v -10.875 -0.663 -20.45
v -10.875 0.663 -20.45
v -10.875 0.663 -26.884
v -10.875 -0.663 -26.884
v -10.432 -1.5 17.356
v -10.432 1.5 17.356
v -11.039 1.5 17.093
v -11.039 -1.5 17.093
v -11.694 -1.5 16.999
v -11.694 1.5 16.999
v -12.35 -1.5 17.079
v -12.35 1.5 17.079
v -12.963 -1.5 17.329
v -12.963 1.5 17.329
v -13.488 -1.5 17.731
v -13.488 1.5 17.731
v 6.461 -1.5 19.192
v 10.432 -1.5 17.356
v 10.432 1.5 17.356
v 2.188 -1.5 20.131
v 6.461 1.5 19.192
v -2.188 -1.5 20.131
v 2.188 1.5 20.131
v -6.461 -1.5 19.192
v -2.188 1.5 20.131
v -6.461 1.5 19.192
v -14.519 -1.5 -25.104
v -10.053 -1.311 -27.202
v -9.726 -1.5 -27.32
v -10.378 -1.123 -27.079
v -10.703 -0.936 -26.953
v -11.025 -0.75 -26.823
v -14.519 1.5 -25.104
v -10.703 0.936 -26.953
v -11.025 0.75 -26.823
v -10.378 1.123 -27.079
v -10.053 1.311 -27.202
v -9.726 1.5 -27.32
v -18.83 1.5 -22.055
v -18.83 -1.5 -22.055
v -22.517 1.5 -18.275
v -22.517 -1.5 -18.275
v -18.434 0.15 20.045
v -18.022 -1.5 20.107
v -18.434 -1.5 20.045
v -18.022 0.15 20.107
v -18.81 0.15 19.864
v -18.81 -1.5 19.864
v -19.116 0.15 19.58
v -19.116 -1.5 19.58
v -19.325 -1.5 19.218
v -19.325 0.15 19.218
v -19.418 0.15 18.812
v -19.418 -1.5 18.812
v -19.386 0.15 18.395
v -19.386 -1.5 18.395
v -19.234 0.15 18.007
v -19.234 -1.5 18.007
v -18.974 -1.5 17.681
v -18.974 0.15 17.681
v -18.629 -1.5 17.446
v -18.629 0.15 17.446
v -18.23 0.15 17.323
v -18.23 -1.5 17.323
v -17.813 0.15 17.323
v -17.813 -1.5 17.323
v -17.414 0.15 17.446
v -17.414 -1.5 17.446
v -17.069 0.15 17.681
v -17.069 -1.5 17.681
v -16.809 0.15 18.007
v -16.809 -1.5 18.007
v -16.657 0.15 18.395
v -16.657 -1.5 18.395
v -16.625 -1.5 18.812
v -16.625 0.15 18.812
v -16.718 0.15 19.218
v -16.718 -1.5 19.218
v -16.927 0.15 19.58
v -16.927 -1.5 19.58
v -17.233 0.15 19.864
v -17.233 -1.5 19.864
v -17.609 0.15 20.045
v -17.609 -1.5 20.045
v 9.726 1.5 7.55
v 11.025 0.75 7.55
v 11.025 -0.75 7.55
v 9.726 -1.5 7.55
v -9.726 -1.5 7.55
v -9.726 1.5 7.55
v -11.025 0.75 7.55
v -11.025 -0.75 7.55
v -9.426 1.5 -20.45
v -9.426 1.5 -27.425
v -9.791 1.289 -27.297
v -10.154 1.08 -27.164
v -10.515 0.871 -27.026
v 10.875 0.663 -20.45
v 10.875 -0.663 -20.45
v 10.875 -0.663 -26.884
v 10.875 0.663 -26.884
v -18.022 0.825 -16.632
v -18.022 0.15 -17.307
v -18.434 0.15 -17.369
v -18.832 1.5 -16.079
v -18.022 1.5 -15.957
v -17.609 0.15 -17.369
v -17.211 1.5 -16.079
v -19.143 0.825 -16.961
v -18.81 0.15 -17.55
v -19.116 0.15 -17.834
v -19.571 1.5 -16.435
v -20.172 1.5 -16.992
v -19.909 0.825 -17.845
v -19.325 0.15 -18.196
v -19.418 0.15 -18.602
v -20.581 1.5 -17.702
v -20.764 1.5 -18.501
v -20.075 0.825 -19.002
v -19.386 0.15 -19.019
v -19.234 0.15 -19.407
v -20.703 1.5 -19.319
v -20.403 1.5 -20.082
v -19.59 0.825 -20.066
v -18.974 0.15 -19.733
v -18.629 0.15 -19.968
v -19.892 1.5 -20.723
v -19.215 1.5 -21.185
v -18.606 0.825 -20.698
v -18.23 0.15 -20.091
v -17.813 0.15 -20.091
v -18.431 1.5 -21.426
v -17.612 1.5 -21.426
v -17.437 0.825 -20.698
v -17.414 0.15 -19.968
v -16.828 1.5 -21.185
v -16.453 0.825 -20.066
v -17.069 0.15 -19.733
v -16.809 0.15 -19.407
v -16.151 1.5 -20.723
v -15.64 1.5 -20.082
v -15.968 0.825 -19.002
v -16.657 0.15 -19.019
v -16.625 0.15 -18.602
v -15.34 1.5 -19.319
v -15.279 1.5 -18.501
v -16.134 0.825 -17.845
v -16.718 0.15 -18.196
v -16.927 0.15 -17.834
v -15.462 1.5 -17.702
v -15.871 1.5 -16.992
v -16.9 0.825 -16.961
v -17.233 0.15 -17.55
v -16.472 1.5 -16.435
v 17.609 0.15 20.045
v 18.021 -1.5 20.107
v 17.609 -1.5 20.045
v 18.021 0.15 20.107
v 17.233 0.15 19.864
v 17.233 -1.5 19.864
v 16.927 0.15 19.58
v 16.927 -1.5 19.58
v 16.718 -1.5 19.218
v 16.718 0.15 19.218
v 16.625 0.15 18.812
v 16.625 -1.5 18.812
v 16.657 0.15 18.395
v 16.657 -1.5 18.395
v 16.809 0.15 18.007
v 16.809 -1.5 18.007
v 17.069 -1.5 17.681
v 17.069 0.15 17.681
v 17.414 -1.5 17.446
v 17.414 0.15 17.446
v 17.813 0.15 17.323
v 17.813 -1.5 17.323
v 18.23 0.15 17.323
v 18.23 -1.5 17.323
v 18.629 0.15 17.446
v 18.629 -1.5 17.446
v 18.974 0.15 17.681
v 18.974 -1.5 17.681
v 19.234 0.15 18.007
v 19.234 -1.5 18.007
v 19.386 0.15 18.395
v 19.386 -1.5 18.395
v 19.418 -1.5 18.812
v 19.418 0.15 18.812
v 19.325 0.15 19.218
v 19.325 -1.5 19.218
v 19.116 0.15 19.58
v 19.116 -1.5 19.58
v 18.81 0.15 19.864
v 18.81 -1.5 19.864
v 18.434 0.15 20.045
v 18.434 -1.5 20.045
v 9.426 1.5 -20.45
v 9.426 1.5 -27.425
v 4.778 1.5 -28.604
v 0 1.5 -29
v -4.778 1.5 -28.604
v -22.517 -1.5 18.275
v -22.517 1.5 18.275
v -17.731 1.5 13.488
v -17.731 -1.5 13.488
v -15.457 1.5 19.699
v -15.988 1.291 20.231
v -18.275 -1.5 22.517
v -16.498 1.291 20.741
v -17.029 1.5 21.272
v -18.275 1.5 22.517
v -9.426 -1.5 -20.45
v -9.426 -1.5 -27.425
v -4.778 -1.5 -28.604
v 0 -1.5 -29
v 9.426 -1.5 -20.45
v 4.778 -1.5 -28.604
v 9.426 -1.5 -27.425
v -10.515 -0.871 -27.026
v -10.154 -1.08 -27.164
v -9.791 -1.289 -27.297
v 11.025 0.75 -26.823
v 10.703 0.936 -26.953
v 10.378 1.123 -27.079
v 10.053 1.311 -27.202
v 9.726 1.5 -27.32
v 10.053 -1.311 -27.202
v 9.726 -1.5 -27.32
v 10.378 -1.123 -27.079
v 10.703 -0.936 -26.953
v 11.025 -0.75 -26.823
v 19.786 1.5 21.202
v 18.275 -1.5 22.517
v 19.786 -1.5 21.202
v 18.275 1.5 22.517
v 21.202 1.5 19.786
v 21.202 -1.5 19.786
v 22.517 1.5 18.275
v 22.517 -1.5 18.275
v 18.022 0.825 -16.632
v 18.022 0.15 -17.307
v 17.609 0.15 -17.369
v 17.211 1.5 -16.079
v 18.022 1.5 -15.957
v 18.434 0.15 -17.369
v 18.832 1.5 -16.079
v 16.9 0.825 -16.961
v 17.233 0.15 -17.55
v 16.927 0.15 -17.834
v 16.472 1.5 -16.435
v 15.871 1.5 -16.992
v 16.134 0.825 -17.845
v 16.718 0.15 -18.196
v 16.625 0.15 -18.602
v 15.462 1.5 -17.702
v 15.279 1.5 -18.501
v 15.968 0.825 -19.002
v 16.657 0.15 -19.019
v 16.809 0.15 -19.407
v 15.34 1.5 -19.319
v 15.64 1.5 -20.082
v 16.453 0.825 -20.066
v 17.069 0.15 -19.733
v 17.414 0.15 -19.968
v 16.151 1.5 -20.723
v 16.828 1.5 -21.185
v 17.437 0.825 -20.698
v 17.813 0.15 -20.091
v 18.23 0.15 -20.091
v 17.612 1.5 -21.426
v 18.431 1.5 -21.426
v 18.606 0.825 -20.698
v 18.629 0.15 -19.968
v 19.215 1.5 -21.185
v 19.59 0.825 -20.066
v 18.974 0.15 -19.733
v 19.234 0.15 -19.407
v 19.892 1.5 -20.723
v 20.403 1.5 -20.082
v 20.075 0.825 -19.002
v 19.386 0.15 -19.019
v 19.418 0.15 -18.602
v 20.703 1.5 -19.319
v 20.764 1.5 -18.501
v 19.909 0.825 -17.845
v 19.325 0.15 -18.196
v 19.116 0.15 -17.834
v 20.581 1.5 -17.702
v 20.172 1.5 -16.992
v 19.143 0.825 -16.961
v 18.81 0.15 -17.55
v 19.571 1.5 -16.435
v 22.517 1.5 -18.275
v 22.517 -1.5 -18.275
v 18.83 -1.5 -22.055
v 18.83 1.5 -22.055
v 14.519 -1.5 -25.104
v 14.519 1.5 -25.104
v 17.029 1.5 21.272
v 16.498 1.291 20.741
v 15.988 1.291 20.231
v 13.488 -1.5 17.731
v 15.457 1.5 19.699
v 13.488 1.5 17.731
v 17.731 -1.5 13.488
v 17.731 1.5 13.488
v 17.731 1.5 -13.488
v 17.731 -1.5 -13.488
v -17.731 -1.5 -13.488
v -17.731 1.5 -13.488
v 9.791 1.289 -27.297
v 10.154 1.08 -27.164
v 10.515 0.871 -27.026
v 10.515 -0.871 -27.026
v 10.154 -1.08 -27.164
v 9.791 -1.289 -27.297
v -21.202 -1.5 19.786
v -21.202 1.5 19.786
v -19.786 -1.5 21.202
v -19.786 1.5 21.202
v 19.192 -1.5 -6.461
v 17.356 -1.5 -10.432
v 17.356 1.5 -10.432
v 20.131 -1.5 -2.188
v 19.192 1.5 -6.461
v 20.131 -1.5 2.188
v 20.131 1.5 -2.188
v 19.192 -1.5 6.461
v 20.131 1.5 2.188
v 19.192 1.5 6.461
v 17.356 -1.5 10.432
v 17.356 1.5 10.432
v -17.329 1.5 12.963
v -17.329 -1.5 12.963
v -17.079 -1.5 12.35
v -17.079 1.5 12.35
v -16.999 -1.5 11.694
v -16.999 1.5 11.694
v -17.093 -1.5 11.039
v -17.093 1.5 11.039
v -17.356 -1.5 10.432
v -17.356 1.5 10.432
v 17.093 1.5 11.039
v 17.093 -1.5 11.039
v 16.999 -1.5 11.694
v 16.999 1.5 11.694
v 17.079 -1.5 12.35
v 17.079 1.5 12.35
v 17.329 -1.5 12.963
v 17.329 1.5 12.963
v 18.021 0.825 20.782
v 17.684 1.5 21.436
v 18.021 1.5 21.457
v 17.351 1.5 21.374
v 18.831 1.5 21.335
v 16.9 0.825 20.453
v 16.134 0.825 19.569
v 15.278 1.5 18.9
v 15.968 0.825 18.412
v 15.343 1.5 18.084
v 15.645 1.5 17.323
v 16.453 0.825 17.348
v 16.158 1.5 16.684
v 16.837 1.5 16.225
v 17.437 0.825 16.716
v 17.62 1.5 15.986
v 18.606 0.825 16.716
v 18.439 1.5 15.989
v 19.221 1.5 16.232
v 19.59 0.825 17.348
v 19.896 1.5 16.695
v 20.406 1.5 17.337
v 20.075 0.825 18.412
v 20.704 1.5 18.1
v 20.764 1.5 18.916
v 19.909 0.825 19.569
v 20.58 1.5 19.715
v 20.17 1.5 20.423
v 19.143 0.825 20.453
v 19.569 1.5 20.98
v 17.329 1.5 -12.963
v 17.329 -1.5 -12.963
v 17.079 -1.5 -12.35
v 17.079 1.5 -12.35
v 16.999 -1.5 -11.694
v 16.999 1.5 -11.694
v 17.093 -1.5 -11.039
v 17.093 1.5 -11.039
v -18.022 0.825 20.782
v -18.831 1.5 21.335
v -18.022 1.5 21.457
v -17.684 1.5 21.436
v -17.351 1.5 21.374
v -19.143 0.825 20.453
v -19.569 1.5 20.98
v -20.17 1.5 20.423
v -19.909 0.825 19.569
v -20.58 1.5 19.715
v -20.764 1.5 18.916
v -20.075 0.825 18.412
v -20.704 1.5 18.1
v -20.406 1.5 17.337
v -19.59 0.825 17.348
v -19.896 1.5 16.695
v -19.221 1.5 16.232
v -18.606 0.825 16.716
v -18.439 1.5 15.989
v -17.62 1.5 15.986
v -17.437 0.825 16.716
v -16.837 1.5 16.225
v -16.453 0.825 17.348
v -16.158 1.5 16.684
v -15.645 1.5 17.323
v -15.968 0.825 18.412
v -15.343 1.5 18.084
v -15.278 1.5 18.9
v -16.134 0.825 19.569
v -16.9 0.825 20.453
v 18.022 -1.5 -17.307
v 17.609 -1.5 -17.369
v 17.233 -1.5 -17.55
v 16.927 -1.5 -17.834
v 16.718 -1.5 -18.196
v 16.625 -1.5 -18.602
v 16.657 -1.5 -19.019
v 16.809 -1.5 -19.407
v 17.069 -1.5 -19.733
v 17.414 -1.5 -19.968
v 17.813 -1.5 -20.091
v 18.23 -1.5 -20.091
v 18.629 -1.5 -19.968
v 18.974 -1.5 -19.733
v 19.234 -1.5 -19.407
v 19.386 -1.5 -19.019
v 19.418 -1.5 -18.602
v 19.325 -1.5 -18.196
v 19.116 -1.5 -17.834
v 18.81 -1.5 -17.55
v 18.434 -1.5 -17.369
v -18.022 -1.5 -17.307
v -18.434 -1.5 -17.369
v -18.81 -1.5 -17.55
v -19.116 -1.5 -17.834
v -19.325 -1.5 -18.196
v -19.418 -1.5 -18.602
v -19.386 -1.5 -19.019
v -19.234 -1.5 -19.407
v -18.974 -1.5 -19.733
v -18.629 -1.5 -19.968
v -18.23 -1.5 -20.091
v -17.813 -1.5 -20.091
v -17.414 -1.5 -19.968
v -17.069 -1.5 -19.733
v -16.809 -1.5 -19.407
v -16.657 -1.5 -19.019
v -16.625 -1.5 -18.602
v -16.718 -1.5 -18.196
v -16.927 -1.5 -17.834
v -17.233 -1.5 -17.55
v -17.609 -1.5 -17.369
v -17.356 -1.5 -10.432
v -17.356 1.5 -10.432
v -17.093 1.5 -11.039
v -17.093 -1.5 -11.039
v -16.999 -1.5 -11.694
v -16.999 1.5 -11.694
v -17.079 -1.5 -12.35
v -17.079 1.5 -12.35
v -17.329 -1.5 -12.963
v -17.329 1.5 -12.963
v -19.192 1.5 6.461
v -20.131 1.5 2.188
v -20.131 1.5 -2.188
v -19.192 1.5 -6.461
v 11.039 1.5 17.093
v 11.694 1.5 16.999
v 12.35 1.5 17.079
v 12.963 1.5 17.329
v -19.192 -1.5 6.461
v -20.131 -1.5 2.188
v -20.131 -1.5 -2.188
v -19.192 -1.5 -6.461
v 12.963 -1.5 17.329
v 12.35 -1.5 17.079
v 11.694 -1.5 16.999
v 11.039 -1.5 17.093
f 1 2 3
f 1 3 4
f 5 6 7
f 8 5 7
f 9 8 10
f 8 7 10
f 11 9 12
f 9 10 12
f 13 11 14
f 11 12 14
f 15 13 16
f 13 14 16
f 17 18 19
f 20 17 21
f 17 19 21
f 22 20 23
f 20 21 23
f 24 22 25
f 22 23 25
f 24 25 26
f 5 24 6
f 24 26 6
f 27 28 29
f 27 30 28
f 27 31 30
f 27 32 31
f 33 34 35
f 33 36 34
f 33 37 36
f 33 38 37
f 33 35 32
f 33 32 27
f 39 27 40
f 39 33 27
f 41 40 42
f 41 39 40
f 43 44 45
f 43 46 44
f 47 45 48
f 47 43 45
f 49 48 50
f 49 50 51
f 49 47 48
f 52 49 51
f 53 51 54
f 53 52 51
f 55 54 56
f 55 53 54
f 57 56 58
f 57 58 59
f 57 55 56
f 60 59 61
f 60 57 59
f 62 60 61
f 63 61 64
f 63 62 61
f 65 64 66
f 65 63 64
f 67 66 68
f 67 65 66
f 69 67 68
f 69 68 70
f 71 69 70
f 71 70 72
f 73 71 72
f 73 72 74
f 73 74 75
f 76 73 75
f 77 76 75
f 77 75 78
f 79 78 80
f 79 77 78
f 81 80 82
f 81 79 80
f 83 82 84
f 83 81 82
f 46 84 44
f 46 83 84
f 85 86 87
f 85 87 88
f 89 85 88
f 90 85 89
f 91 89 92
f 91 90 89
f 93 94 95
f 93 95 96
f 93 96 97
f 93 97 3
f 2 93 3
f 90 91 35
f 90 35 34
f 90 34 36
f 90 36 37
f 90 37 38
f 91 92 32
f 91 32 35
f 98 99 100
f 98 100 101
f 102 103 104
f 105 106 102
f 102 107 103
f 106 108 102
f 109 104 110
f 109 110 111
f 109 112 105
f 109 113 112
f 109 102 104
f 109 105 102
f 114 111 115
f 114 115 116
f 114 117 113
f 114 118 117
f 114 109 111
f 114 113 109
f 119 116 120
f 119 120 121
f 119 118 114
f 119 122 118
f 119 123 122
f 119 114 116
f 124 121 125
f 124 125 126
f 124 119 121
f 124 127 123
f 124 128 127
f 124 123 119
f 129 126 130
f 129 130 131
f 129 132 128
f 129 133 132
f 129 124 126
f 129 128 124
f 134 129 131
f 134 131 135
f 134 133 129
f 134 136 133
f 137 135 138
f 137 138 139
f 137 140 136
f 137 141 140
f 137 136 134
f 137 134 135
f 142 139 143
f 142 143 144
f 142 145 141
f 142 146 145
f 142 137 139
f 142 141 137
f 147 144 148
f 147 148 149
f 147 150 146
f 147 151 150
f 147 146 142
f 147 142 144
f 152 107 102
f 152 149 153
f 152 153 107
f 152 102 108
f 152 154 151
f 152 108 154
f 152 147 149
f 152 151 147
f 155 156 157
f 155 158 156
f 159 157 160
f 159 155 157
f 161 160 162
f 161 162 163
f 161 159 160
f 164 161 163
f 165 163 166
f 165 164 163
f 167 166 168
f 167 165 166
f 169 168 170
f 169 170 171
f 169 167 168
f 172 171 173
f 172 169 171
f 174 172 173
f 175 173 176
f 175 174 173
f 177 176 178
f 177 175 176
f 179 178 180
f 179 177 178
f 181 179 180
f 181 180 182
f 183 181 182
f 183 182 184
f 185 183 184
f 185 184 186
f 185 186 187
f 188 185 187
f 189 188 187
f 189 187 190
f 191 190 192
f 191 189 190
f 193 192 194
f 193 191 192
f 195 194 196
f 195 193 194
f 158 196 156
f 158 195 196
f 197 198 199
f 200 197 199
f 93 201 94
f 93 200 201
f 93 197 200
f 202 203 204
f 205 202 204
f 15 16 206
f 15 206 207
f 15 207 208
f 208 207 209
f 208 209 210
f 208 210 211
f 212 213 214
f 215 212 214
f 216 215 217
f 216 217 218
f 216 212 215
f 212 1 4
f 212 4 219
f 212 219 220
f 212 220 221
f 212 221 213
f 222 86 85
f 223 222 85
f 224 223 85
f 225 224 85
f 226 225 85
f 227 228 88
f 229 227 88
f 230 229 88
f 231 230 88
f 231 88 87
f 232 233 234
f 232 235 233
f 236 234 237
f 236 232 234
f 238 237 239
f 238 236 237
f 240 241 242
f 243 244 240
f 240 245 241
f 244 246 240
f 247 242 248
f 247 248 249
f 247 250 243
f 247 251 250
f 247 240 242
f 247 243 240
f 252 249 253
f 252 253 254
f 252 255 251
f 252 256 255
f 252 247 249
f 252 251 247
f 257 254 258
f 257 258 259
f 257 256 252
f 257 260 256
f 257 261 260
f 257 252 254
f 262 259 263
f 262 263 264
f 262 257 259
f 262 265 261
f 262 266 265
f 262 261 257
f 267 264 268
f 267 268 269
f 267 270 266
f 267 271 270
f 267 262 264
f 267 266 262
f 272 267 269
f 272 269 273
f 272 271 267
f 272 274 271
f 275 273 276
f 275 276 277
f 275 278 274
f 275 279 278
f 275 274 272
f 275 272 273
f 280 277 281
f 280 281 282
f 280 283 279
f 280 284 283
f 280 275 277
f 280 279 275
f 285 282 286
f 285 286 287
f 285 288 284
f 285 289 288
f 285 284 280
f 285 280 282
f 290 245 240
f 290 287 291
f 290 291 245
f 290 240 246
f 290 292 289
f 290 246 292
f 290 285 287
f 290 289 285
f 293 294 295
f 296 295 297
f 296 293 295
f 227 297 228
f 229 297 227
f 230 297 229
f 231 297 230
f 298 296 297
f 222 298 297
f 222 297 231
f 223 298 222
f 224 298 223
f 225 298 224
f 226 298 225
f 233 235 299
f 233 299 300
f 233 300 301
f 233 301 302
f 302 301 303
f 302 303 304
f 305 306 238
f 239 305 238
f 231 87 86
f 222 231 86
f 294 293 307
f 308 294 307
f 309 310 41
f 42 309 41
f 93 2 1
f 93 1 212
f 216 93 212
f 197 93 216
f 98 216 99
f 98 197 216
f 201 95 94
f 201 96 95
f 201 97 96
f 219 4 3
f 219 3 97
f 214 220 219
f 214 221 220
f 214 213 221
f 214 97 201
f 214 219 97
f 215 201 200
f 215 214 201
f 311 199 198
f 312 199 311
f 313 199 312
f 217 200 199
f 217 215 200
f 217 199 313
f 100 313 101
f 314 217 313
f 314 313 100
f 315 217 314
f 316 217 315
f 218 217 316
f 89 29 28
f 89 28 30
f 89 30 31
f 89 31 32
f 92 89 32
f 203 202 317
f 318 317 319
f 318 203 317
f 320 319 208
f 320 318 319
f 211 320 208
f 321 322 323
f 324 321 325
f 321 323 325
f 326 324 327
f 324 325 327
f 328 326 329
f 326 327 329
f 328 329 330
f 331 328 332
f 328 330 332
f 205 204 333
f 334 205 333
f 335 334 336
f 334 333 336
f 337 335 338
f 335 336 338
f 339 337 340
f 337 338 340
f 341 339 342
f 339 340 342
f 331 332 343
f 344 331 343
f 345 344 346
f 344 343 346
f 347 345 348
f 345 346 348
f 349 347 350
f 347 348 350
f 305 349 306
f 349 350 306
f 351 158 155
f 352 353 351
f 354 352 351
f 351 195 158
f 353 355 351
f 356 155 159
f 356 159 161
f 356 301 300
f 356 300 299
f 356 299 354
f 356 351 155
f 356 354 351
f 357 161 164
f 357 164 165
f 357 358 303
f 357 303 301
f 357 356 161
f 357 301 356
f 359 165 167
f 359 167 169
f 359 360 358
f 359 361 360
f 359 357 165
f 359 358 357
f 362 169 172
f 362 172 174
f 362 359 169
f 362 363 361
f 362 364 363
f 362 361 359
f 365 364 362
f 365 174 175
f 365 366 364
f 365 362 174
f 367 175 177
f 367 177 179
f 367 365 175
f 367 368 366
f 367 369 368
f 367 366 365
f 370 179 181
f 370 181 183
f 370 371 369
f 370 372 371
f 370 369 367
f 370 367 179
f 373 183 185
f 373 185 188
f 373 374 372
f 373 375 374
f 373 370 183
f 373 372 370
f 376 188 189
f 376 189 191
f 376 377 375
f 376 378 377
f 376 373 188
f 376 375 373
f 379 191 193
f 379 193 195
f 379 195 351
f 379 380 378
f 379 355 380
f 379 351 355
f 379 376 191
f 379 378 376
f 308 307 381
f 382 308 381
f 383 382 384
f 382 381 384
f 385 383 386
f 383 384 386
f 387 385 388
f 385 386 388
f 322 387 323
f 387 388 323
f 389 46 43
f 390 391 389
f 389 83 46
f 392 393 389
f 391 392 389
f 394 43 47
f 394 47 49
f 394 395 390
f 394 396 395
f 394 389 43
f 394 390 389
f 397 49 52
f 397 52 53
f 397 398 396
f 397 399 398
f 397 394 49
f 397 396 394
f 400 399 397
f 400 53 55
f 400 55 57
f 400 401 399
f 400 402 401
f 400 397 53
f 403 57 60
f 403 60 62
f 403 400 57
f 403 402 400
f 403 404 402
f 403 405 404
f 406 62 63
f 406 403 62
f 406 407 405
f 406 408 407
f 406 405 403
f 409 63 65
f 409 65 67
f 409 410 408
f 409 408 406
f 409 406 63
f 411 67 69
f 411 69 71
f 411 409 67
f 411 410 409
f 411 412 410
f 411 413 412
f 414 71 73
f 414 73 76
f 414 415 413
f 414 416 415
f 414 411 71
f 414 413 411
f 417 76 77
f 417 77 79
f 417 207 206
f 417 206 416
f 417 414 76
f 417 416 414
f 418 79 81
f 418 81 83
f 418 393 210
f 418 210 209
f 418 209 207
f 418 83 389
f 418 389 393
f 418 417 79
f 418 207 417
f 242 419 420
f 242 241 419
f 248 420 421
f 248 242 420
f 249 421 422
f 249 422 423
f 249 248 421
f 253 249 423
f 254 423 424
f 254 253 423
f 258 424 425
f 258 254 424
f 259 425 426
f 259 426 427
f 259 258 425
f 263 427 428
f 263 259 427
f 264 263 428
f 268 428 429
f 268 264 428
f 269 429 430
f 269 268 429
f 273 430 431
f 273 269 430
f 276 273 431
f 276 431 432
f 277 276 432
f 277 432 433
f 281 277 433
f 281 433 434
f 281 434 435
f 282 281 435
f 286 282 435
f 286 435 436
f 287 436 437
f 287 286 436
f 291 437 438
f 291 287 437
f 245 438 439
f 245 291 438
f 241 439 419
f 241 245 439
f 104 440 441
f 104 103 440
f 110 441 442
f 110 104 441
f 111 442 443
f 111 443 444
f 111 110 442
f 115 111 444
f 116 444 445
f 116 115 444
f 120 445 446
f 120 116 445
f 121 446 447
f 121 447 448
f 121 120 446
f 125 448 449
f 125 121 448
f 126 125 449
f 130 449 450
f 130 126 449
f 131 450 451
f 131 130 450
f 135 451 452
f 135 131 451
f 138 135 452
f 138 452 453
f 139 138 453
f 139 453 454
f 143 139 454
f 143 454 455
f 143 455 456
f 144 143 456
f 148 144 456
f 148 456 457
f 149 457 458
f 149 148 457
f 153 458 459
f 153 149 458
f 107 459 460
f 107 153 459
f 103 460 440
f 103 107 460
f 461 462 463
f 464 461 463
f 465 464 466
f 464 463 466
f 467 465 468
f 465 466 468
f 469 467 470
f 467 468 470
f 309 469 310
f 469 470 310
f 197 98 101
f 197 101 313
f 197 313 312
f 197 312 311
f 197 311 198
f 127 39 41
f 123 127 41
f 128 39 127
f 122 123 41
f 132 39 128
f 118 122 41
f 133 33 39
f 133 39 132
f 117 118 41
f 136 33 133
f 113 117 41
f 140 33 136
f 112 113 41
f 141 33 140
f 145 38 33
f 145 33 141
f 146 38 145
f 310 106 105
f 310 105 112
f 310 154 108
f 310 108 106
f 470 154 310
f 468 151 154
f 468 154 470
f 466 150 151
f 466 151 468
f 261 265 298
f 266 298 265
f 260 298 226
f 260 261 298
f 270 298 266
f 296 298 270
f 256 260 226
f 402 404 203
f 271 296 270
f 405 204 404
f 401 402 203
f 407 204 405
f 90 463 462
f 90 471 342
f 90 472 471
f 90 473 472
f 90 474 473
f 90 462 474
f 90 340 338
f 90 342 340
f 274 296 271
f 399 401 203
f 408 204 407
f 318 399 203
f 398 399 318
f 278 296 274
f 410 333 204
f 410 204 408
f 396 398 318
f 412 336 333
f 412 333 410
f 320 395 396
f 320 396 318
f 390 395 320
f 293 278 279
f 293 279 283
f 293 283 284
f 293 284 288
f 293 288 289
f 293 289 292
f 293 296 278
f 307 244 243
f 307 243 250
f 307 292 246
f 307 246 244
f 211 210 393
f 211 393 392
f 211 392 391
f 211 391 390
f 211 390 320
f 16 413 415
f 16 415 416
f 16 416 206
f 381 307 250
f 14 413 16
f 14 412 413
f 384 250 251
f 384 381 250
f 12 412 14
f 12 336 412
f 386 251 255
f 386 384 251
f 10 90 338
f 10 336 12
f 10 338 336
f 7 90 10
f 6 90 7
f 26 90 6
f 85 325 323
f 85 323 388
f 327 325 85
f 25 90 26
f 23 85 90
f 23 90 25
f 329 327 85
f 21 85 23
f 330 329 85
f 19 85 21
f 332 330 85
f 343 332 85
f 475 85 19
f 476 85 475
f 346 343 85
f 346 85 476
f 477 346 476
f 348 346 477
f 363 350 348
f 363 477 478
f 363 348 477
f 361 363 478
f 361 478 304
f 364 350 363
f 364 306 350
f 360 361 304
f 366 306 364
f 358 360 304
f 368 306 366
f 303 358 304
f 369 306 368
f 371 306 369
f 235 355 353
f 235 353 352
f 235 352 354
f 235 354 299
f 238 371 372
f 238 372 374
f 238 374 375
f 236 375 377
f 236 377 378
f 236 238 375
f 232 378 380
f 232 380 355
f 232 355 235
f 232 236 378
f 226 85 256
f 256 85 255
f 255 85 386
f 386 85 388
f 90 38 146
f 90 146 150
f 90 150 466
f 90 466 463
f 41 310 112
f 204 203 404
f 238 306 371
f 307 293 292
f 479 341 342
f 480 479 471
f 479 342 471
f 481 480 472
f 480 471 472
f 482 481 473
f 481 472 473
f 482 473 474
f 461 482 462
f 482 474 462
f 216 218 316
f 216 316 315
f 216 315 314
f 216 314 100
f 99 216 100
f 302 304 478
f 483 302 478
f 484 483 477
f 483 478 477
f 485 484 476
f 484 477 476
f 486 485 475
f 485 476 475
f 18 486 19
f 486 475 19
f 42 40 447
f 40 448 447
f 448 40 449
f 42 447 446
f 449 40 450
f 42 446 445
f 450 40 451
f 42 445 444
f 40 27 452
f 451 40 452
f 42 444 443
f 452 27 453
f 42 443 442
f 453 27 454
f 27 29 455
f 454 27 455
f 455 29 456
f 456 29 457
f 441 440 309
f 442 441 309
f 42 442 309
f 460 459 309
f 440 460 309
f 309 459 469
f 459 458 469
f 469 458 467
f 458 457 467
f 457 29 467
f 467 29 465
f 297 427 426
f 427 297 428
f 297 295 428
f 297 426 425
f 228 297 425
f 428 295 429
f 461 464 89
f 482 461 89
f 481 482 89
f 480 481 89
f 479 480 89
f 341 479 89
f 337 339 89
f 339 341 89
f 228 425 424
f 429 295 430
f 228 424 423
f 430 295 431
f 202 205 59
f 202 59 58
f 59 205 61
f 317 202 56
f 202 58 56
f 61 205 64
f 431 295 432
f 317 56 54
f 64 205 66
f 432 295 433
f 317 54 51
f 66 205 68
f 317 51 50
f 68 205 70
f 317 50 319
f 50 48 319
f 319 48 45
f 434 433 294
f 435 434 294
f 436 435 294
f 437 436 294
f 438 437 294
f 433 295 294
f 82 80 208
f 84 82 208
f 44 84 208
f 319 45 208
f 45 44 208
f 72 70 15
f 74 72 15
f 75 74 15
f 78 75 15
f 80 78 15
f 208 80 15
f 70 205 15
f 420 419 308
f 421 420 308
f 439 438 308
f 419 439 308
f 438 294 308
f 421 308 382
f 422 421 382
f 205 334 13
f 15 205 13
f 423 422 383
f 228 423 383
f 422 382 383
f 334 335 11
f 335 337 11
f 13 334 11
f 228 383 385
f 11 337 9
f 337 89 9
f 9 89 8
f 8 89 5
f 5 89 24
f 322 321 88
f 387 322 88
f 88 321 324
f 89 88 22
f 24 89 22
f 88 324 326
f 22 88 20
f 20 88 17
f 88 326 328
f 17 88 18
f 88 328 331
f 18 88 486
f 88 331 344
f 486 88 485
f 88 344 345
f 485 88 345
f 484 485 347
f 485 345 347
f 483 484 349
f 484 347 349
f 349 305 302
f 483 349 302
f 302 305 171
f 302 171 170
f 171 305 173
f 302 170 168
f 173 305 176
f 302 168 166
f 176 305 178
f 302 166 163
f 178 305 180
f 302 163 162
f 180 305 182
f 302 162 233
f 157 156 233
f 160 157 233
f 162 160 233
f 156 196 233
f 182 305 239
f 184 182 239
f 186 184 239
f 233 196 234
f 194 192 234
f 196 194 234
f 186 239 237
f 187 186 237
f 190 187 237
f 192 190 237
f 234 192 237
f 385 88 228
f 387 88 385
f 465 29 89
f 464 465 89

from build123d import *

# Parameters (mm, degrees)
SKETCH1_R                                      = 29
BOSS_EXTRUDE1_DEPTH                            = 1.5
CUT_EXTRUDE1_DEPTH                             = 42.12177039
BOSS_EXTRUDE2_REACH                            = 46.997
BOSS_EXTRUDE2_END_RADIUS                       = 29
BOSS_EXTRUDE3_REACH                            = 59.346
BOSS_EXTRUDE3_END_RADIUS                       = 29
CUT_EXTRUDE8_DEPTH                             = 42.12177039
CSK_FOR_M2_5_FLAT_HEAD_MACHINE_SCREW2_AT_COUNT = 2
CSK_FOR_M2_5_FLAT_HEAD_MACHINE_SCREW2_AT_PITCH = 36.043
CSK_FOR_M2_5_FLAT_HEAD_MACHINE_SCREW_2_COUNT   = 2
CSK_FOR_M2_5_FLAT_HEAD_MACHINE_SCREW_2_PITCH   = 51.950988874
CSK_FOR_M2_5_FLAT_HEAD_MACHINE_SCREW_3_COUNT   = 2
CSK_FOR_M2_5_FLAT_HEAD_MACHINE_SCREW_3_PITCH   = 37.414


with BuildPart() as part:
    # Sketch1 → Boss-Extrude1 (new, symmetric)
    with BuildSketch(Plane(origin=(0, 0, 0), x_dir=(1, 0, 0), z_dir=(0, 1, 0))):
        with Locations(Location((0, 0, 0), (0, 0, 270))):
            Circle(SKETCH1_R)
    extrude(amount=BOSS_EXTRUDE1_DEPTH, both=True)

    # Sketch2 → Cut-Extrude1 (cut, through all)
    with BuildSketch(Plane(origin=(0, 1.5, 0), x_dir=(1, 0, 0), z_dir=(0, 1, 0))):
        Polygon((-11.025, 7.55), (-11.025, 29), (11.025, 29), (11.025, 7.55), (11.025, -7.55), (-11.025, -7.55), align=None)
    extrude(amount=-CUT_EXTRUDE1_DEPTH, mode=Mode.SUBTRACT)

    # Boss-Extrude2: up to this cylinder (the profile starts inside it)
    boss_extrude2_end = Plane(origin=(0, -0.7325095, 0), z_dir=(0, -1, 0)) * Cylinder(BOSS_EXTRUDE2_END_RADIUS, 154.459019, mode=Mode.PRIVATE)
    # Sketch3 → Boss-Extrude2 (add, up to the surface)
    with BuildSketch(Plane(origin=(0, 0, 7.55), x_dir=(-1, 0, 0), z_dir=(0, 0, -1)), mode=Mode.PRIVATE) as boss_extrude2_sk1:
        Polygon((-11.525, -1.5), (-9.725961894, -1.5), (-11.025, -0.75), (-11.025, 0.75), (-9.725961894, 1.5), (-11.525, 1.5), align=None)
    boss_extrude2_tool1 = extrude(boss_extrude2_sk1.sketch, amount=BOSS_EXTRUDE2_REACH, mode=Mode.PRIVATE) & boss_extrude2_end
    add(boss_extrude2_tool1.solids().sort_by_distance((10.625481, -1.465019, 7.55))[0])
    # Sketch3 → Boss-Extrude2 (add, up to the surface)
    with BuildSketch(Plane(origin=(0, 0, 7.55), x_dir=(-1, 0, 0), z_dir=(0, 0, -1)), mode=Mode.PRIVATE) as boss_extrude2_sk2:
        Polygon((11.525, 1.5), (11.525, -1.5), (9.725961894, -1.5), (11.025, -0.75), (11.025, 0.75), (9.725961894, 1.5), align=None)
    boss_extrude2_tool2 = extrude(boss_extrude2_sk2.sketch, amount=BOSS_EXTRUDE2_REACH, mode=Mode.PRIVATE) & boss_extrude2_end
    add(boss_extrude2_tool2.solids().sort_by_distance((-11.490019, 0, 7.55))[0])

    # Sketch17 → Cut-Extrude8 (cut, through all)
    with BuildSketch(Plane(origin=(0, 1.5, 0), x_dir=(1, 0, 0), z_dir=(0, 1, 0))):
        with BuildLine():
            ThreePointArc((-22.517398398, 18.274757711), (-29, 0), (-22.517398398, -18.274757711))
            Line((-22.517398398, -18.274757711), (-17.730812648, -13.488171961))
            ThreePointArc((-17.730812648, -13.488171961), (-17.017188537, -12.024869111), (-17.355878546, -10.432448414))
            ThreePointArc((-17.355878546, -10.432448414), (-20.25, 0), (-17.355878546, 10.432448414))
            ThreePointArc((-17.355878546, 10.432448414), (-17.017188537, 12.024869111), (-17.730812648, 13.488171961))
            Line((-17.730812648, 13.488171961), (-22.517398398, 18.274757711))
        make_face()
        with BuildLine():
            ThreePointArc((-18.274757711, -22.517398398), (0, -29), (18.274757711, -22.517398398))
            Line((18.274757711, -22.517398398), (13.488171961, -17.730812648))
            ThreePointArc((13.488171961, -17.730812648), (12.024869111, -17.017188537), (10.432448414, -17.355878546))
            ThreePointArc((10.432448414, -17.355878546), (0, -20.25), (-10.432448414, -17.355878546))
            ThreePointArc((-10.432448414, -17.355878546), (-12.024869111, -17.017188537), (-13.488171961, -17.730812648))
            Line((-13.488171961, -17.730812648), (-18.274757711, -22.517398398))
        make_face()
        with BuildLine():
            Line((17.730812648, -13.488171961), (22.517398398, -18.274757711))
            ThreePointArc((22.517398398, -18.274757711), (29, 0), (22.517398398, 18.274757711))
            Line((22.517398398, 18.274757711), (17.730812648, 13.488171961))
            ThreePointArc((17.730812648, 13.488171961), (17.017188537, 12.024869111), (17.355878546, 10.432448414))
            ThreePointArc((17.355878546, 10.432448414), (20.25, 0), (17.355878546, -10.432448414))
            ThreePointArc((17.355878546, -10.432448414), (17.017188537, -12.024869111), (17.730812648, -13.488171961))
        make_face()
    extrude(amount=-CUT_EXTRUDE8_DEPTH, mode=Mode.SUBTRACT)

    # Sketch19 → CSK for M2.5 Flat Head Machine Screw2 (revolve, cut)
    with BuildSketch(Plane(origin=(-18.0215, 1.5, -18.707), x_dir=(0, 0, 1), z_dir=(1, 0, 0))):
        Polygon((0, 0), (0, 3), (1.4, 3), (1.4, 1.35), (2.75, 0), align=None)
    csk_for_m2_5_flat_head_machine_screw2 = revolve(axis=Axis((-18.0215, 7.85, -18.707), (0, -1, 0)), mode=Mode.SUBTRACT)

    # CSK for M2.5 Flat Head Machine Screw2 at: CSK for M2.5 Flat Head Machine Screw2 ×2
    with Locations(*[(i * CSK_FOR_M2_5_FLAT_HEAD_MACHINE_SCREW2_AT_PITCH, 0, 0) for i in range(1, CSK_FOR_M2_5_FLAT_HEAD_MACHINE_SCREW2_AT_COUNT)]):
        add(csk_for_m2_5_flat_head_machine_screw2, mode=Mode.SUBTRACT)

    # CSK for M2.5 Flat Head Machine Screw 2: CSK for M2.5 Flat Head Machine Screw2 ×2
    with Locations(*[Vector(0.69378852609191, 0, 0.7201787840968487) * (i * CSK_FOR_M2_5_FLAT_HEAD_MACHINE_SCREW_2_PITCH) for i in range(1, CSK_FOR_M2_5_FLAT_HEAD_MACHINE_SCREW_2_COUNT)]):
        add(csk_for_m2_5_flat_head_machine_screw2, mode=Mode.SUBTRACT)

    # CSK for M2.5 Flat Head Machine Screw 3: CSK for M2.5 Flat Head Machine Screw2 ×2
    with Locations(*[(0, 0, i * CSK_FOR_M2_5_FLAT_HEAD_MACHINE_SCREW_3_PITCH) for i in range(1, CSK_FOR_M2_5_FLAT_HEAD_MACHINE_SCREW_3_COUNT)]):
        add(csk_for_m2_5_flat_head_machine_screw2, mode=Mode.SUBTRACT)


with BuildPart() as body_2:
    # Boss-Extrude3: up to this cylinder (the profile starts inside it)
    boss_extrude3_end = Plane(origin=(0, 0, 0), z_dir=(0, -1, 0)) * Cylinder(BOSS_EXTRUDE3_END_RADIUS, 177.692, mode=Mode.PRIVATE)
    # Sketch6 → Boss-Extrude3 (new, up to the surface)
    with BuildSketch(Plane(origin=(0, 0, -20.45), x_dir=(-1, 0, 0), z_dir=(0, 0, -1)), mode=Mode.PRIVATE) as boss_extrude3_sk1:
        Polygon((9.425961894, -1.5), (-9.425961894, -1.5), (-10.875, -0.66339746), (-10.875, 0.66339746), (-9.425961894, 1.5), (9.425961894, 1.5), (10.875, 0.66339746), (10.875, -0.66339746), align=None)
    boss_extrude3_tool1 = extrude(boss_extrude3_sk1.sketch, amount=BOSS_EXTRUDE3_REACH, mode=Mode.PRIVATE) & boss_extrude3_end
    add(boss_extrude3_tool1.solids().sort_by_distance((0, 0, -20.45))[0])


solid = Compound([part.part, body_2.part])
